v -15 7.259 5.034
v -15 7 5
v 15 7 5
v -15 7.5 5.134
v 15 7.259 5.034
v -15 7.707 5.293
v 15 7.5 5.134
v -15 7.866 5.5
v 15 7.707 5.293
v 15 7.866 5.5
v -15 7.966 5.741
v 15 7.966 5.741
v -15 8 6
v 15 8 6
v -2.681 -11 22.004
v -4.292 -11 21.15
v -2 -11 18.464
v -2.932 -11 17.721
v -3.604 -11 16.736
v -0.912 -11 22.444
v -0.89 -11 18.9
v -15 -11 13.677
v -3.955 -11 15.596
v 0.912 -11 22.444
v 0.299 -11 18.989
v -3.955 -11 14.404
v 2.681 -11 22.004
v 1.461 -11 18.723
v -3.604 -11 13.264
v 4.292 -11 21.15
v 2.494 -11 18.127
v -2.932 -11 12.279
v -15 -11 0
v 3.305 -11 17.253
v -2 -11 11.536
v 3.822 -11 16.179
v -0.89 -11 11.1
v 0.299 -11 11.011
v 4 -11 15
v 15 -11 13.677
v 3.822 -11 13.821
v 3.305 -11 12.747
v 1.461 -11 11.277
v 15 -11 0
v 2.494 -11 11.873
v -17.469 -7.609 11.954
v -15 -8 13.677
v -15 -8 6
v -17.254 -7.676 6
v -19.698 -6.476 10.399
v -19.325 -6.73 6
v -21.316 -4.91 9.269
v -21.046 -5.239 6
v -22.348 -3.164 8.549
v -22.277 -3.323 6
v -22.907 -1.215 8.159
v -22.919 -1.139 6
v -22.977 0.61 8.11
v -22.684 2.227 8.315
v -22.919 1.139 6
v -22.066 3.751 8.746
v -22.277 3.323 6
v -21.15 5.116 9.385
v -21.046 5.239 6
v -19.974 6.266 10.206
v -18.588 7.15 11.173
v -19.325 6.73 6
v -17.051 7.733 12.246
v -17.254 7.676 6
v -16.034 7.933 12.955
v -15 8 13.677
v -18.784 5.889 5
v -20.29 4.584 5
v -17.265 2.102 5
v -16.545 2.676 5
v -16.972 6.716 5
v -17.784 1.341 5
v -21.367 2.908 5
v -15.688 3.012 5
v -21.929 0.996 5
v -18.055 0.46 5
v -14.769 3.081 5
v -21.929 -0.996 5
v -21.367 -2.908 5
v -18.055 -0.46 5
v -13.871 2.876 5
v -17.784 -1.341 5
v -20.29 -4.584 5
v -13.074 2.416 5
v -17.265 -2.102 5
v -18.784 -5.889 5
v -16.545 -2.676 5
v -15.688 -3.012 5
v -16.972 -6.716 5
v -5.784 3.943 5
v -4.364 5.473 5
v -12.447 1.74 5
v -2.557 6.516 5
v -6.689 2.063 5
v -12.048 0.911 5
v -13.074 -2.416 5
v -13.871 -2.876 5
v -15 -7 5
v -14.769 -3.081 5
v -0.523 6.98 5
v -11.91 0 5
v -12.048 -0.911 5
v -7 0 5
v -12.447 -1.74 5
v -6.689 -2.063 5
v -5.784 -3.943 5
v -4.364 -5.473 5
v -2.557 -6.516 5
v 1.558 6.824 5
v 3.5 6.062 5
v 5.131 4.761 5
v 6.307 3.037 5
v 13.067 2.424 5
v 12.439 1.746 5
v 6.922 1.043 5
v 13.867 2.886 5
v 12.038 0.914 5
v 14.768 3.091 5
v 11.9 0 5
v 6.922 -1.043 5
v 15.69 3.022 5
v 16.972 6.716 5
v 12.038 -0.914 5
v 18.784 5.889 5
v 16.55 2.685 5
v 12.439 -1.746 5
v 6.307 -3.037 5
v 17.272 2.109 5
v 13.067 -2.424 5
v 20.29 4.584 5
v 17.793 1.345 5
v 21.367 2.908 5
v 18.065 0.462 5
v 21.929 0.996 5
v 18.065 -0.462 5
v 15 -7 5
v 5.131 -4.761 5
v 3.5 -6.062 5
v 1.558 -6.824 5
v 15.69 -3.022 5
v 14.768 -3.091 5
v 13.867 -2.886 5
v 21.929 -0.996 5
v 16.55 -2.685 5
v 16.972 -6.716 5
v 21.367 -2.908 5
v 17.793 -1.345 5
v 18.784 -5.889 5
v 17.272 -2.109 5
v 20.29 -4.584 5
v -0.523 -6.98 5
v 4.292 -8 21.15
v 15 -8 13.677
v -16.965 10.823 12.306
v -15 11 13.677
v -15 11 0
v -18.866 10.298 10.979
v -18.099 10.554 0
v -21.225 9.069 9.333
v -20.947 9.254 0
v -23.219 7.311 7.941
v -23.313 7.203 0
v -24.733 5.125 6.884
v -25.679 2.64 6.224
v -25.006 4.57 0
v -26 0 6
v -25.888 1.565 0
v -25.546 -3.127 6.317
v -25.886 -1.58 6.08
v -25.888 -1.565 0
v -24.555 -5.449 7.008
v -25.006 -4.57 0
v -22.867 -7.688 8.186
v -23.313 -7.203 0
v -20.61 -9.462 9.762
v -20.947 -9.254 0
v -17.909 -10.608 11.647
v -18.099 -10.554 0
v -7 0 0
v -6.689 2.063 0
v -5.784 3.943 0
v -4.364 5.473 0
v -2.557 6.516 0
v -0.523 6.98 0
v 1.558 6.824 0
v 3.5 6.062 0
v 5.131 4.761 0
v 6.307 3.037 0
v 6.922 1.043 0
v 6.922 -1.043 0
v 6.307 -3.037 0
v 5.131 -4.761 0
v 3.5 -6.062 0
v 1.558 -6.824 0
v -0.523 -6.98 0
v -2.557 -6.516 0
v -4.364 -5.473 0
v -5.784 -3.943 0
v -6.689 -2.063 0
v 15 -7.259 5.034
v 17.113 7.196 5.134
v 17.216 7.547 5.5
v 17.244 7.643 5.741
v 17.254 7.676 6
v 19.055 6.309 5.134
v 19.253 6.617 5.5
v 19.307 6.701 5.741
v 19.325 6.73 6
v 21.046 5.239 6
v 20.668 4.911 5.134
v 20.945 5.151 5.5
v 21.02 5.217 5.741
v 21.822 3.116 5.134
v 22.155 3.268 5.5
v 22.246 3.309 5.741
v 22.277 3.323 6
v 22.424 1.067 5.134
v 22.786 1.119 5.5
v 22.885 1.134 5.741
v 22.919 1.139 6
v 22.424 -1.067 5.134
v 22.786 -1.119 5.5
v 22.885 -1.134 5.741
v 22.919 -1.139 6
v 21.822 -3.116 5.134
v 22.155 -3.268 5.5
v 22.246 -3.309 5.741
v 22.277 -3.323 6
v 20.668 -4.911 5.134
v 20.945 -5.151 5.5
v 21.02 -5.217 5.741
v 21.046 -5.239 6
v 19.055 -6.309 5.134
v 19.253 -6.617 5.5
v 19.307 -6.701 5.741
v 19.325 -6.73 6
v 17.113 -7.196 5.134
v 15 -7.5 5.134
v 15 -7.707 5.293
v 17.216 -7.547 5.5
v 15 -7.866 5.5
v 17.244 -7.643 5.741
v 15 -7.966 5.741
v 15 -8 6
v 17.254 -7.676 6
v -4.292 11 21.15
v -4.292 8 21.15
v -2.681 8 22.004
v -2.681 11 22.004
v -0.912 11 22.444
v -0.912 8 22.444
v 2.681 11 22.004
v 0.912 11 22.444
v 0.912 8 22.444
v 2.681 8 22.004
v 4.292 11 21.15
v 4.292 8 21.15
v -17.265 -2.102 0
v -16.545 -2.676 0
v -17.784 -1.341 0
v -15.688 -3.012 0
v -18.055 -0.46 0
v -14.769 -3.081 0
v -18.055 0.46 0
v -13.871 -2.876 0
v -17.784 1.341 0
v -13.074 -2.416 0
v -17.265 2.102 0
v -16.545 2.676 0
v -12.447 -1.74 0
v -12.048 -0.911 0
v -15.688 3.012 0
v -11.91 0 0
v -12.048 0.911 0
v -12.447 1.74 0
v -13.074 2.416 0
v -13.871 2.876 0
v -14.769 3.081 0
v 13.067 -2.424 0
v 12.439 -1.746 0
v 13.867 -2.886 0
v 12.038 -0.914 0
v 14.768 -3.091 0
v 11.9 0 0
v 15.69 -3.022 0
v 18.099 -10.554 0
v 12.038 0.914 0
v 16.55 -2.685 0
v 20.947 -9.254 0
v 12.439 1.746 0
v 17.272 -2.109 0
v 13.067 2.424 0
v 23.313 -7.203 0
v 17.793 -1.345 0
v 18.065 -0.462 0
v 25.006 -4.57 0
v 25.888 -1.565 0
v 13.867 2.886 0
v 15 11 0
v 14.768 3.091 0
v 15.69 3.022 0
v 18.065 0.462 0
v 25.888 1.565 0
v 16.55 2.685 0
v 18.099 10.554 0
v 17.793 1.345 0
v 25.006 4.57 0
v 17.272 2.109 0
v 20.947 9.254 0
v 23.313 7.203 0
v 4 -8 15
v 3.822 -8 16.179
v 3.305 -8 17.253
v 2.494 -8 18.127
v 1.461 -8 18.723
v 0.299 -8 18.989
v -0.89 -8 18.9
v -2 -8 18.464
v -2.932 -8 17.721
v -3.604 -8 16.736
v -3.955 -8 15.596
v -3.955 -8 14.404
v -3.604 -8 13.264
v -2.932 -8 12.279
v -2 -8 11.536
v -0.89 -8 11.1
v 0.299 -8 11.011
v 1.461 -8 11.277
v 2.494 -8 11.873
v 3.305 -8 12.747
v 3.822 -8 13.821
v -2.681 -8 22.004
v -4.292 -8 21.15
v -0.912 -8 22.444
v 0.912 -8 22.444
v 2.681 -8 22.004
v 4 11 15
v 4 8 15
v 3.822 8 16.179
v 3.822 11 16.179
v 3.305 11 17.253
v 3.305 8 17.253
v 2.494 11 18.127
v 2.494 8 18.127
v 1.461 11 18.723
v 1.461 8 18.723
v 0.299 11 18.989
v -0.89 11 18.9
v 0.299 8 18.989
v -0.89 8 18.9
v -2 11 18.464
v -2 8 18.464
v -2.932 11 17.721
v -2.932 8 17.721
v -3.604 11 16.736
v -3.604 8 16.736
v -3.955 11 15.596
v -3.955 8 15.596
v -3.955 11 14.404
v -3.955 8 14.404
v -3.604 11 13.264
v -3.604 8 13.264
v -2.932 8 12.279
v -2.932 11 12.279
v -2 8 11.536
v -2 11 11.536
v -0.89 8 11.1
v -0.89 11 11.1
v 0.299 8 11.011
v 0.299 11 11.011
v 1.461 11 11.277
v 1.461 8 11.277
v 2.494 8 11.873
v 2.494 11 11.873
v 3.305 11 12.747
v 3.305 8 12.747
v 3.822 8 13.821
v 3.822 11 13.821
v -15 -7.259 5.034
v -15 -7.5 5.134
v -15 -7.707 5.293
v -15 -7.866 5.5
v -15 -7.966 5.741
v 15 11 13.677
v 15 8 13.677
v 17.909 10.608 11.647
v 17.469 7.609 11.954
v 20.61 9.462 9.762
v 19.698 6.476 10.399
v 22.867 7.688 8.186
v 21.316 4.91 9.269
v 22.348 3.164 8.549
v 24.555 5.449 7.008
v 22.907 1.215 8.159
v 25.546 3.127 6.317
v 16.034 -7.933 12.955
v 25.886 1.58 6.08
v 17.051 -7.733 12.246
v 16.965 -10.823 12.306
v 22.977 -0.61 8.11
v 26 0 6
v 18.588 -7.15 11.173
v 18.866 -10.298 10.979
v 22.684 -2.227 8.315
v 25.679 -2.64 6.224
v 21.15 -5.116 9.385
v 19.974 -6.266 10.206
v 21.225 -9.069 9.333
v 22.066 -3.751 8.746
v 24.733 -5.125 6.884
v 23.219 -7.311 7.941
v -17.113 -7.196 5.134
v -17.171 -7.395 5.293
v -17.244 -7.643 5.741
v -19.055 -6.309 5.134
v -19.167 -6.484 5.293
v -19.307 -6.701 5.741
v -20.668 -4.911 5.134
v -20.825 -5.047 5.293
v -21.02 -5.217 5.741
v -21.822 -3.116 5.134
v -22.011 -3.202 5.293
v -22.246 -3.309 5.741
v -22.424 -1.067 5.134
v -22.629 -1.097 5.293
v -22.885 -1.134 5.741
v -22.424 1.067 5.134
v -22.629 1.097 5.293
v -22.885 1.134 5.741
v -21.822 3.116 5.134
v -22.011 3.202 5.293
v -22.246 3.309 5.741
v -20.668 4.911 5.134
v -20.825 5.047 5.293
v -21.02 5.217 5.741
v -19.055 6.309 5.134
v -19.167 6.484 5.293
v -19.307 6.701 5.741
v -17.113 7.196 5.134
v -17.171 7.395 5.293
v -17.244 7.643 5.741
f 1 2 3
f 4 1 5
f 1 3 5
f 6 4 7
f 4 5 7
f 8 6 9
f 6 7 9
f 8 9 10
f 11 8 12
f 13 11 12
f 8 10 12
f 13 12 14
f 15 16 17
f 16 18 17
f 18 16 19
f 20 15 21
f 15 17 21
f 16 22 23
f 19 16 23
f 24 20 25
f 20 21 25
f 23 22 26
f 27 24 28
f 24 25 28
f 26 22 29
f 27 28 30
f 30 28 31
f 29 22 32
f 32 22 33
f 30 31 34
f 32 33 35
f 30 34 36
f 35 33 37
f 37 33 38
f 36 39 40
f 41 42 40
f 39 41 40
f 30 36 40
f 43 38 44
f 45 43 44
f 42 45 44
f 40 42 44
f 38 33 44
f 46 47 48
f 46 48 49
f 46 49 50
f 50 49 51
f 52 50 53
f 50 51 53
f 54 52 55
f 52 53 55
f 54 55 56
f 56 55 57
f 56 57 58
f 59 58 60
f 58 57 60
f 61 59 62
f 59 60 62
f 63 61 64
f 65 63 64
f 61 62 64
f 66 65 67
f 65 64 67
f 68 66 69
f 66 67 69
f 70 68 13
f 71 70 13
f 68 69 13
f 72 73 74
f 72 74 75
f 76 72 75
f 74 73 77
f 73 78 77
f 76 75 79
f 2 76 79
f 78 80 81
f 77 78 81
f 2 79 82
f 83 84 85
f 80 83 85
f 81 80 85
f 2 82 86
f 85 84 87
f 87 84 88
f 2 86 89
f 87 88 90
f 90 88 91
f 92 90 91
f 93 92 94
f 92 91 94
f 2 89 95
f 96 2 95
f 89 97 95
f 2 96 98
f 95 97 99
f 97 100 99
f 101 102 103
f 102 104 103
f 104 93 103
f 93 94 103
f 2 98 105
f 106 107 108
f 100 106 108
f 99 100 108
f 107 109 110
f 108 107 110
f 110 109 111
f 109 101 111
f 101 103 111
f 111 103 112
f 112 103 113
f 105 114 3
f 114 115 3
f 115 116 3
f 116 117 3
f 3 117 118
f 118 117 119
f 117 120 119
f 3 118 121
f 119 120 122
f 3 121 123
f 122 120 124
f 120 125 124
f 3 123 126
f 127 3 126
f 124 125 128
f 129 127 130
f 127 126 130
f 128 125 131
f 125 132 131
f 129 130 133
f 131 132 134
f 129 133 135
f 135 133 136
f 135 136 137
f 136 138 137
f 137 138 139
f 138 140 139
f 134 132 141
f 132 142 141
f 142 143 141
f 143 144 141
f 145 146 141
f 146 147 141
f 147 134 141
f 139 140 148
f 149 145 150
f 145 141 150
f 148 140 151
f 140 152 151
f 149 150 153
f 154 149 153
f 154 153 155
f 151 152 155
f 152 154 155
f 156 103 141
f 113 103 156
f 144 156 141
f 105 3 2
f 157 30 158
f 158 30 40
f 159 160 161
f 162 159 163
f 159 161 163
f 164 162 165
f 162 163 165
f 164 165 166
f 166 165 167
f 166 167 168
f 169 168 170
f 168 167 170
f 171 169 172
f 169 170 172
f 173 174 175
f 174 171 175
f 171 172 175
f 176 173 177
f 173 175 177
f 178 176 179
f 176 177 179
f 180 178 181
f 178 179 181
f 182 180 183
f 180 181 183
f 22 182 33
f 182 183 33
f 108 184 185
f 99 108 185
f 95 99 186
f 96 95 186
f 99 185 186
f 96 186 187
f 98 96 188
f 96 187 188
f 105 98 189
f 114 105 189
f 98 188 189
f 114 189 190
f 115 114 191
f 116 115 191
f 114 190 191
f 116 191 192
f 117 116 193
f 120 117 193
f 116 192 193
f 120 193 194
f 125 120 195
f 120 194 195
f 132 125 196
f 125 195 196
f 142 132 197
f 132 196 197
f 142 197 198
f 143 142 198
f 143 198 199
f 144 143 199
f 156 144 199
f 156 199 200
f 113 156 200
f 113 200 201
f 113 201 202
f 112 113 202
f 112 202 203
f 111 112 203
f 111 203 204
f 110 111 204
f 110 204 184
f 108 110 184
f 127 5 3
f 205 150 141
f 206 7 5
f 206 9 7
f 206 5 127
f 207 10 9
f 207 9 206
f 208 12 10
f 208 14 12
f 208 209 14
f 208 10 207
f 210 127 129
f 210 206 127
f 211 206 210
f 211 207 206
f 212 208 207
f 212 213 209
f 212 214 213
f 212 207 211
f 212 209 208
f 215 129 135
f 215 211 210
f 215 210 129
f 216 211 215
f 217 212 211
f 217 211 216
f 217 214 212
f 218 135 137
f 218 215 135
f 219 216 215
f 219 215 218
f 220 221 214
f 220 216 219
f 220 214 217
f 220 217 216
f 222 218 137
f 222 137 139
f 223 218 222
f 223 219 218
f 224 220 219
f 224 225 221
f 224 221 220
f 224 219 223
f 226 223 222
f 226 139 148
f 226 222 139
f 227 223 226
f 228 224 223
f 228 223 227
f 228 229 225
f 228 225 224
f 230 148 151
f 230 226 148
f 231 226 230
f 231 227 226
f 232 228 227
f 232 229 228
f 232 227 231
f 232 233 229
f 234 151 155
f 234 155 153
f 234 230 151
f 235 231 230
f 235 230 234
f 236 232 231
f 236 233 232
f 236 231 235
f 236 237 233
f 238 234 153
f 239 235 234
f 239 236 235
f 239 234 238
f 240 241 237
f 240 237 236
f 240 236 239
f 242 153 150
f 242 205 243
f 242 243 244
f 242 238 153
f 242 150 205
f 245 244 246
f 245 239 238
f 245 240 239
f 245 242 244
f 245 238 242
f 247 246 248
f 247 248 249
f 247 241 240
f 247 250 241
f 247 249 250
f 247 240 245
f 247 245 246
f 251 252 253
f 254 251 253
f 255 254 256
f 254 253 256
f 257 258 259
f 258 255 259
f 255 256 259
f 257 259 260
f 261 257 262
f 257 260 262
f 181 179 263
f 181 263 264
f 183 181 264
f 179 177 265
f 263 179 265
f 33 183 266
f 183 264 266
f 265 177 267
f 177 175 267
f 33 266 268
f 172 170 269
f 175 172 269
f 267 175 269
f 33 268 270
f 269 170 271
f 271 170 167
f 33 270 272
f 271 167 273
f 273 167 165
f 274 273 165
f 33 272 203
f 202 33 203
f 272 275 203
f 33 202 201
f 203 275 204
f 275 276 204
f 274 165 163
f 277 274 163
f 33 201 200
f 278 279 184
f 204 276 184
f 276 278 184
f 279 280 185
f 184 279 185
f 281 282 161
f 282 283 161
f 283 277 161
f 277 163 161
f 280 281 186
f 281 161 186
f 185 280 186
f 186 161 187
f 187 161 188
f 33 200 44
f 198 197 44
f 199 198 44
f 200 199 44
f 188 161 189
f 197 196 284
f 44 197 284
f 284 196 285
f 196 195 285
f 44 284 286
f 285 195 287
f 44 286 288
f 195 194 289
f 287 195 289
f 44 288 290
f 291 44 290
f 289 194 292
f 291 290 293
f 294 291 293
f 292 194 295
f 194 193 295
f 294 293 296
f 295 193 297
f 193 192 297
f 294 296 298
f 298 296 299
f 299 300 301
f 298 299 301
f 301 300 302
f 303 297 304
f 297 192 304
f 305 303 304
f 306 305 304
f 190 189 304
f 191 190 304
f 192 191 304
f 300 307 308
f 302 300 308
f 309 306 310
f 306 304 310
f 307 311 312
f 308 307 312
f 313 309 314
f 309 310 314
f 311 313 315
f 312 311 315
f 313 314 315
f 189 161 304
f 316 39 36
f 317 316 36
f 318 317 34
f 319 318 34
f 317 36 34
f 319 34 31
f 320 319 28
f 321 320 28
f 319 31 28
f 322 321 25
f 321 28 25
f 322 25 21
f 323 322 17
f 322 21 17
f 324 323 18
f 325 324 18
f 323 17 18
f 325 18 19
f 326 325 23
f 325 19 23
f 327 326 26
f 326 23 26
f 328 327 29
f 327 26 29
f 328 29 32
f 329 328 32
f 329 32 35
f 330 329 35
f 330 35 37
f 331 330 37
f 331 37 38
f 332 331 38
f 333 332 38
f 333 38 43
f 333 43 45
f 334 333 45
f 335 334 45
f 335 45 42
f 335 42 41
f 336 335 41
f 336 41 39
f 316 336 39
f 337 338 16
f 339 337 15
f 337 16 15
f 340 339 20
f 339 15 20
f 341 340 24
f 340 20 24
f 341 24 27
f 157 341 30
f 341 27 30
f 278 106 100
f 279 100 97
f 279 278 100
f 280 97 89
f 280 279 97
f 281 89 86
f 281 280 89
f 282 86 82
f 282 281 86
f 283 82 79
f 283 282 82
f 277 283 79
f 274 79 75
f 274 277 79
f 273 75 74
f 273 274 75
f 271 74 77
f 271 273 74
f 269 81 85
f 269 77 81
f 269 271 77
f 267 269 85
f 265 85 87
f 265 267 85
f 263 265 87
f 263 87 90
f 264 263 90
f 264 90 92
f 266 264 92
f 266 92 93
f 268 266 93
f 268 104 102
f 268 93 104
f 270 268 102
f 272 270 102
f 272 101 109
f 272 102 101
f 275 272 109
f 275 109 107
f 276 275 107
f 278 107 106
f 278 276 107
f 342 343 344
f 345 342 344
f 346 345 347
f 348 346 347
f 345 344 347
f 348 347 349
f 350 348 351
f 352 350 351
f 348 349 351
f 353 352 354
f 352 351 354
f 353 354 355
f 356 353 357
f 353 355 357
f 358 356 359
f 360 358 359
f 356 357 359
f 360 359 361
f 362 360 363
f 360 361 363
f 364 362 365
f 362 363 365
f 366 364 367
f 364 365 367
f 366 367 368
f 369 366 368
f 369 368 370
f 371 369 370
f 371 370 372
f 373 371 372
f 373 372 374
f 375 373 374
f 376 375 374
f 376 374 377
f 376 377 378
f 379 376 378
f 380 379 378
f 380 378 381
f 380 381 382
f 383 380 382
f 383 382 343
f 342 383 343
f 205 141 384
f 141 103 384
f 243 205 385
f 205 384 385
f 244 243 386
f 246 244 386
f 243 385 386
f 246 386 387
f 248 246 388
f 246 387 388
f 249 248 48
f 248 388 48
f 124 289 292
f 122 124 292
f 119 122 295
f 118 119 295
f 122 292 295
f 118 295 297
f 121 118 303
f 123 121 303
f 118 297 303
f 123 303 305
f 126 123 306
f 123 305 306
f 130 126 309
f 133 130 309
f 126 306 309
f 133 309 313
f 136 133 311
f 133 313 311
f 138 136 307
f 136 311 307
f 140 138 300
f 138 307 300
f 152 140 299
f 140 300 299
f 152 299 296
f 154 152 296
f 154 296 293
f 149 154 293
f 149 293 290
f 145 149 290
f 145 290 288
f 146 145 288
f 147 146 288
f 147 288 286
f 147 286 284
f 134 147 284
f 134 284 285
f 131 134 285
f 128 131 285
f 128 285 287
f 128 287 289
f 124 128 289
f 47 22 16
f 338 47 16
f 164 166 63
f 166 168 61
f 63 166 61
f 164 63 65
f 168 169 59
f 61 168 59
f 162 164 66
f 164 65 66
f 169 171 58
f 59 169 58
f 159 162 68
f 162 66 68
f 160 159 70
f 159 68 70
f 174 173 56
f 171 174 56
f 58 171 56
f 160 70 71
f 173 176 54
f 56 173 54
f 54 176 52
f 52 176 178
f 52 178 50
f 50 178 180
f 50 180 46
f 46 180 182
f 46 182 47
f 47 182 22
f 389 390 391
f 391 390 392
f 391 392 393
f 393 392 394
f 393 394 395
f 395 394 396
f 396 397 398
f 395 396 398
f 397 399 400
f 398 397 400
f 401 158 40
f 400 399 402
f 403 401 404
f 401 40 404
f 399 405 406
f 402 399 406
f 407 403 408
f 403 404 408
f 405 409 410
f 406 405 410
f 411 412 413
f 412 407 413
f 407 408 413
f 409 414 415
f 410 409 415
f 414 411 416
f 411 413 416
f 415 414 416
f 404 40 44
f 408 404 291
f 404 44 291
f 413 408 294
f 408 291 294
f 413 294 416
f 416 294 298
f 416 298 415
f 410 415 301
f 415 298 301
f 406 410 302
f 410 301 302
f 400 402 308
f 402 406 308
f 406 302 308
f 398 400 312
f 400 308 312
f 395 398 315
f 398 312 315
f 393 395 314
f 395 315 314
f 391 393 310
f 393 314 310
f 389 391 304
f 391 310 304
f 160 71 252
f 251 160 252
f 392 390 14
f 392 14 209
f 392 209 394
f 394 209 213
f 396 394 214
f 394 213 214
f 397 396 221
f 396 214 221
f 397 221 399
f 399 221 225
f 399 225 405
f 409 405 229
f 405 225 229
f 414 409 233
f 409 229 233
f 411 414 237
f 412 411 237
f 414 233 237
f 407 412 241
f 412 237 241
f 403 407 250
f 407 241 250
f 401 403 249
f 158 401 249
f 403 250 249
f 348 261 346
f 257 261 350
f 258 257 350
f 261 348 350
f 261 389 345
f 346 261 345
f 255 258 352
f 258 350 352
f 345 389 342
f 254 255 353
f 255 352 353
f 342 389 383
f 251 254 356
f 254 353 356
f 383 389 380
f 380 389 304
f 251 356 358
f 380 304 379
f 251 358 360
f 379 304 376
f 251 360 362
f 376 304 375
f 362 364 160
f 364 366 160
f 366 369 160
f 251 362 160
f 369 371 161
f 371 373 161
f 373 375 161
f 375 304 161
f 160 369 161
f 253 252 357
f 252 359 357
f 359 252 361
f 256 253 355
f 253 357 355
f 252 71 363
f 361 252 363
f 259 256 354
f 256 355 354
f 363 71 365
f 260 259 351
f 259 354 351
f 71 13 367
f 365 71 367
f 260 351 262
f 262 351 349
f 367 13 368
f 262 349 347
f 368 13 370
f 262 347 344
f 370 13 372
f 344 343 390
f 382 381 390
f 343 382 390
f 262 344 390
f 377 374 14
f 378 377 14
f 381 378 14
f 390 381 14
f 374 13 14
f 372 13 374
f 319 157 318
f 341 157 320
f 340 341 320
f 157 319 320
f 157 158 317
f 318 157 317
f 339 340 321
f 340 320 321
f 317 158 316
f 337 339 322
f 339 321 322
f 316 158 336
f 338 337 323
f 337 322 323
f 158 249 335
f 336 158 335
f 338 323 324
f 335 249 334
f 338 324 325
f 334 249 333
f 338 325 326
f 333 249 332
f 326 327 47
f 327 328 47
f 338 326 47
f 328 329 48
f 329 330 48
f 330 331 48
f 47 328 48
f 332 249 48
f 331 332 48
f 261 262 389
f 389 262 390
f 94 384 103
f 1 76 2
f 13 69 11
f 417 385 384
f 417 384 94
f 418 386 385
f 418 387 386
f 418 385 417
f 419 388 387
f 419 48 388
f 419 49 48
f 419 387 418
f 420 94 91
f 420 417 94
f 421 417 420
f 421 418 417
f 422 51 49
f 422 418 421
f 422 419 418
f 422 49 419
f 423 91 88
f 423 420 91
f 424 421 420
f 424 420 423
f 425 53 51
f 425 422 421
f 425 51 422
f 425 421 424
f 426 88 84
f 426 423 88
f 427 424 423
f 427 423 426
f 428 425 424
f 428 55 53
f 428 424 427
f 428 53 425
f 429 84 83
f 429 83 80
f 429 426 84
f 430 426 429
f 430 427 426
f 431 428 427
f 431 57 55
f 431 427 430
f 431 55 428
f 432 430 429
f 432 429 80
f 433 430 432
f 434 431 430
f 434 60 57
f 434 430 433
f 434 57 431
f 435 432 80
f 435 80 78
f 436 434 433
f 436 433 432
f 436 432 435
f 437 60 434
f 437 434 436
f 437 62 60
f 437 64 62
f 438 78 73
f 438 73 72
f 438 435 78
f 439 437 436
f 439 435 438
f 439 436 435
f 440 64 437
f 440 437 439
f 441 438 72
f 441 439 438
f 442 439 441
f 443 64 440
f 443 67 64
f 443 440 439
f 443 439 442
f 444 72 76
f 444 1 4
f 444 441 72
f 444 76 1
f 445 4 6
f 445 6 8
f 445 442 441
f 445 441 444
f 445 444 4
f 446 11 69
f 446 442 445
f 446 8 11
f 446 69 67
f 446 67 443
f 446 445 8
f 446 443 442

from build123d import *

# Parameters (mm, degrees)
F0_R     = 3.0896655398
F1_DEPTH = 25
F2_R     = 4
F3_DEPTH = 25
F6_DEPTH = 25
F7_R     = 0.99999


# Not quite as in the source:
# - a fillet or chamfer is up to 0.001 mm smaller than in the source, because OpenCascade refuses the exact size


with BuildPart() as f1:
    # F0 (on Top) → F1 (new body)
    with BuildSketch(Plane.XY):
        with BuildLine():
            ThreePointArc((-15, 11), (-26, 0), (-15, -11))
            Line((-15, -11), (15, -11))
            ThreePointArc((15, -11), (26, 0), (15, 11))
            Line((15, 11), (-15, 11))
        make_face()
        with Locations((-15, 0)):
            Circle(F0_R, mode=Mode.SUBTRACT)
        with BuildLine():
            ThreePointArc((7, 0), (0, -7), (-7, 0))
            ThreePointArc((-7, 0), (0, 7), (7, 0))
        make_face(mode=Mode.SUBTRACT)
        with BuildLine():
            ThreePointArc((18.1, 0), (15, -3.1), (11.9, 0))
            ThreePointArc((11.9, 0), (15, 3.1), (18.1, 0))
        make_face(mode=Mode.SUBTRACT)
    extrude(amount=F1_DEPTH)

    # F2 (on face) → F3 (cut)
    with BuildSketch(Plane.XZ.offset(11)):
        with BuildLine():
            Line((15, 25), (-15, 25))
            Line((-15, 25), (-15, 13.6771502157))
            Line((-15, 13.6771502157), (-4.2923891696, 21.1502353789))
            ThreePointArc((-4.2923891696, 21.1502353789), (0, 22.5), (4.2923891696, 21.1502353789))
            Line((4.2923891696, 21.1502353789), (15, 13.6771502157))
            Line((15, 13.6771502157), (15, 25))
        make_face()
        with BuildLine():
            Line((26, 25), (-26, 25))
            Line((-26, 25), (-26, 6))
            Line((-26, 6), (-4.2923891696, 21.1502353789))
            ThreePointArc((-4.2923891696, 21.1502353789), (0, 22.5), (4.2923891696, 21.1502353789))
            Line((4.2923891696, 21.1502353789), (26, 6))
            Line((26, 6), (26, 25))
        make_face()
        with Locations((0, 15)):
            Circle(F2_R)
    extrude(amount=-F3_DEPTH, mode=Mode.SUBTRACT)

    # F5 (on offset) → F6 (cut)
    with BuildSketch(Plane(origin=(0, 0, 5), x_dir=(1, 0, 0), z_dir=(0, 0, -1))):
        with BuildLine():
            Line((-15, -8), (15, -8))
            ThreePointArc((15, -8), (23, 0), (15, 8))
            Line((15, 8), (-15, 8))
            ThreePointArc((-15, 8), (-23, 0), (-15, -8))
        make_face()
    extrude(amount=-F6_DEPTH, mode=Mode.SUBTRACT)

    # F7 (radius 1 in the source; OpenCascade refuses exactly that, so slightly less here)
    f7_edges = [f1.edges().sort_by_distance(p)[0] for p in [
        (0, -8, 5),
    ]]
    fillet(f7_edges, radius=F7_R)


solid = f1.part
